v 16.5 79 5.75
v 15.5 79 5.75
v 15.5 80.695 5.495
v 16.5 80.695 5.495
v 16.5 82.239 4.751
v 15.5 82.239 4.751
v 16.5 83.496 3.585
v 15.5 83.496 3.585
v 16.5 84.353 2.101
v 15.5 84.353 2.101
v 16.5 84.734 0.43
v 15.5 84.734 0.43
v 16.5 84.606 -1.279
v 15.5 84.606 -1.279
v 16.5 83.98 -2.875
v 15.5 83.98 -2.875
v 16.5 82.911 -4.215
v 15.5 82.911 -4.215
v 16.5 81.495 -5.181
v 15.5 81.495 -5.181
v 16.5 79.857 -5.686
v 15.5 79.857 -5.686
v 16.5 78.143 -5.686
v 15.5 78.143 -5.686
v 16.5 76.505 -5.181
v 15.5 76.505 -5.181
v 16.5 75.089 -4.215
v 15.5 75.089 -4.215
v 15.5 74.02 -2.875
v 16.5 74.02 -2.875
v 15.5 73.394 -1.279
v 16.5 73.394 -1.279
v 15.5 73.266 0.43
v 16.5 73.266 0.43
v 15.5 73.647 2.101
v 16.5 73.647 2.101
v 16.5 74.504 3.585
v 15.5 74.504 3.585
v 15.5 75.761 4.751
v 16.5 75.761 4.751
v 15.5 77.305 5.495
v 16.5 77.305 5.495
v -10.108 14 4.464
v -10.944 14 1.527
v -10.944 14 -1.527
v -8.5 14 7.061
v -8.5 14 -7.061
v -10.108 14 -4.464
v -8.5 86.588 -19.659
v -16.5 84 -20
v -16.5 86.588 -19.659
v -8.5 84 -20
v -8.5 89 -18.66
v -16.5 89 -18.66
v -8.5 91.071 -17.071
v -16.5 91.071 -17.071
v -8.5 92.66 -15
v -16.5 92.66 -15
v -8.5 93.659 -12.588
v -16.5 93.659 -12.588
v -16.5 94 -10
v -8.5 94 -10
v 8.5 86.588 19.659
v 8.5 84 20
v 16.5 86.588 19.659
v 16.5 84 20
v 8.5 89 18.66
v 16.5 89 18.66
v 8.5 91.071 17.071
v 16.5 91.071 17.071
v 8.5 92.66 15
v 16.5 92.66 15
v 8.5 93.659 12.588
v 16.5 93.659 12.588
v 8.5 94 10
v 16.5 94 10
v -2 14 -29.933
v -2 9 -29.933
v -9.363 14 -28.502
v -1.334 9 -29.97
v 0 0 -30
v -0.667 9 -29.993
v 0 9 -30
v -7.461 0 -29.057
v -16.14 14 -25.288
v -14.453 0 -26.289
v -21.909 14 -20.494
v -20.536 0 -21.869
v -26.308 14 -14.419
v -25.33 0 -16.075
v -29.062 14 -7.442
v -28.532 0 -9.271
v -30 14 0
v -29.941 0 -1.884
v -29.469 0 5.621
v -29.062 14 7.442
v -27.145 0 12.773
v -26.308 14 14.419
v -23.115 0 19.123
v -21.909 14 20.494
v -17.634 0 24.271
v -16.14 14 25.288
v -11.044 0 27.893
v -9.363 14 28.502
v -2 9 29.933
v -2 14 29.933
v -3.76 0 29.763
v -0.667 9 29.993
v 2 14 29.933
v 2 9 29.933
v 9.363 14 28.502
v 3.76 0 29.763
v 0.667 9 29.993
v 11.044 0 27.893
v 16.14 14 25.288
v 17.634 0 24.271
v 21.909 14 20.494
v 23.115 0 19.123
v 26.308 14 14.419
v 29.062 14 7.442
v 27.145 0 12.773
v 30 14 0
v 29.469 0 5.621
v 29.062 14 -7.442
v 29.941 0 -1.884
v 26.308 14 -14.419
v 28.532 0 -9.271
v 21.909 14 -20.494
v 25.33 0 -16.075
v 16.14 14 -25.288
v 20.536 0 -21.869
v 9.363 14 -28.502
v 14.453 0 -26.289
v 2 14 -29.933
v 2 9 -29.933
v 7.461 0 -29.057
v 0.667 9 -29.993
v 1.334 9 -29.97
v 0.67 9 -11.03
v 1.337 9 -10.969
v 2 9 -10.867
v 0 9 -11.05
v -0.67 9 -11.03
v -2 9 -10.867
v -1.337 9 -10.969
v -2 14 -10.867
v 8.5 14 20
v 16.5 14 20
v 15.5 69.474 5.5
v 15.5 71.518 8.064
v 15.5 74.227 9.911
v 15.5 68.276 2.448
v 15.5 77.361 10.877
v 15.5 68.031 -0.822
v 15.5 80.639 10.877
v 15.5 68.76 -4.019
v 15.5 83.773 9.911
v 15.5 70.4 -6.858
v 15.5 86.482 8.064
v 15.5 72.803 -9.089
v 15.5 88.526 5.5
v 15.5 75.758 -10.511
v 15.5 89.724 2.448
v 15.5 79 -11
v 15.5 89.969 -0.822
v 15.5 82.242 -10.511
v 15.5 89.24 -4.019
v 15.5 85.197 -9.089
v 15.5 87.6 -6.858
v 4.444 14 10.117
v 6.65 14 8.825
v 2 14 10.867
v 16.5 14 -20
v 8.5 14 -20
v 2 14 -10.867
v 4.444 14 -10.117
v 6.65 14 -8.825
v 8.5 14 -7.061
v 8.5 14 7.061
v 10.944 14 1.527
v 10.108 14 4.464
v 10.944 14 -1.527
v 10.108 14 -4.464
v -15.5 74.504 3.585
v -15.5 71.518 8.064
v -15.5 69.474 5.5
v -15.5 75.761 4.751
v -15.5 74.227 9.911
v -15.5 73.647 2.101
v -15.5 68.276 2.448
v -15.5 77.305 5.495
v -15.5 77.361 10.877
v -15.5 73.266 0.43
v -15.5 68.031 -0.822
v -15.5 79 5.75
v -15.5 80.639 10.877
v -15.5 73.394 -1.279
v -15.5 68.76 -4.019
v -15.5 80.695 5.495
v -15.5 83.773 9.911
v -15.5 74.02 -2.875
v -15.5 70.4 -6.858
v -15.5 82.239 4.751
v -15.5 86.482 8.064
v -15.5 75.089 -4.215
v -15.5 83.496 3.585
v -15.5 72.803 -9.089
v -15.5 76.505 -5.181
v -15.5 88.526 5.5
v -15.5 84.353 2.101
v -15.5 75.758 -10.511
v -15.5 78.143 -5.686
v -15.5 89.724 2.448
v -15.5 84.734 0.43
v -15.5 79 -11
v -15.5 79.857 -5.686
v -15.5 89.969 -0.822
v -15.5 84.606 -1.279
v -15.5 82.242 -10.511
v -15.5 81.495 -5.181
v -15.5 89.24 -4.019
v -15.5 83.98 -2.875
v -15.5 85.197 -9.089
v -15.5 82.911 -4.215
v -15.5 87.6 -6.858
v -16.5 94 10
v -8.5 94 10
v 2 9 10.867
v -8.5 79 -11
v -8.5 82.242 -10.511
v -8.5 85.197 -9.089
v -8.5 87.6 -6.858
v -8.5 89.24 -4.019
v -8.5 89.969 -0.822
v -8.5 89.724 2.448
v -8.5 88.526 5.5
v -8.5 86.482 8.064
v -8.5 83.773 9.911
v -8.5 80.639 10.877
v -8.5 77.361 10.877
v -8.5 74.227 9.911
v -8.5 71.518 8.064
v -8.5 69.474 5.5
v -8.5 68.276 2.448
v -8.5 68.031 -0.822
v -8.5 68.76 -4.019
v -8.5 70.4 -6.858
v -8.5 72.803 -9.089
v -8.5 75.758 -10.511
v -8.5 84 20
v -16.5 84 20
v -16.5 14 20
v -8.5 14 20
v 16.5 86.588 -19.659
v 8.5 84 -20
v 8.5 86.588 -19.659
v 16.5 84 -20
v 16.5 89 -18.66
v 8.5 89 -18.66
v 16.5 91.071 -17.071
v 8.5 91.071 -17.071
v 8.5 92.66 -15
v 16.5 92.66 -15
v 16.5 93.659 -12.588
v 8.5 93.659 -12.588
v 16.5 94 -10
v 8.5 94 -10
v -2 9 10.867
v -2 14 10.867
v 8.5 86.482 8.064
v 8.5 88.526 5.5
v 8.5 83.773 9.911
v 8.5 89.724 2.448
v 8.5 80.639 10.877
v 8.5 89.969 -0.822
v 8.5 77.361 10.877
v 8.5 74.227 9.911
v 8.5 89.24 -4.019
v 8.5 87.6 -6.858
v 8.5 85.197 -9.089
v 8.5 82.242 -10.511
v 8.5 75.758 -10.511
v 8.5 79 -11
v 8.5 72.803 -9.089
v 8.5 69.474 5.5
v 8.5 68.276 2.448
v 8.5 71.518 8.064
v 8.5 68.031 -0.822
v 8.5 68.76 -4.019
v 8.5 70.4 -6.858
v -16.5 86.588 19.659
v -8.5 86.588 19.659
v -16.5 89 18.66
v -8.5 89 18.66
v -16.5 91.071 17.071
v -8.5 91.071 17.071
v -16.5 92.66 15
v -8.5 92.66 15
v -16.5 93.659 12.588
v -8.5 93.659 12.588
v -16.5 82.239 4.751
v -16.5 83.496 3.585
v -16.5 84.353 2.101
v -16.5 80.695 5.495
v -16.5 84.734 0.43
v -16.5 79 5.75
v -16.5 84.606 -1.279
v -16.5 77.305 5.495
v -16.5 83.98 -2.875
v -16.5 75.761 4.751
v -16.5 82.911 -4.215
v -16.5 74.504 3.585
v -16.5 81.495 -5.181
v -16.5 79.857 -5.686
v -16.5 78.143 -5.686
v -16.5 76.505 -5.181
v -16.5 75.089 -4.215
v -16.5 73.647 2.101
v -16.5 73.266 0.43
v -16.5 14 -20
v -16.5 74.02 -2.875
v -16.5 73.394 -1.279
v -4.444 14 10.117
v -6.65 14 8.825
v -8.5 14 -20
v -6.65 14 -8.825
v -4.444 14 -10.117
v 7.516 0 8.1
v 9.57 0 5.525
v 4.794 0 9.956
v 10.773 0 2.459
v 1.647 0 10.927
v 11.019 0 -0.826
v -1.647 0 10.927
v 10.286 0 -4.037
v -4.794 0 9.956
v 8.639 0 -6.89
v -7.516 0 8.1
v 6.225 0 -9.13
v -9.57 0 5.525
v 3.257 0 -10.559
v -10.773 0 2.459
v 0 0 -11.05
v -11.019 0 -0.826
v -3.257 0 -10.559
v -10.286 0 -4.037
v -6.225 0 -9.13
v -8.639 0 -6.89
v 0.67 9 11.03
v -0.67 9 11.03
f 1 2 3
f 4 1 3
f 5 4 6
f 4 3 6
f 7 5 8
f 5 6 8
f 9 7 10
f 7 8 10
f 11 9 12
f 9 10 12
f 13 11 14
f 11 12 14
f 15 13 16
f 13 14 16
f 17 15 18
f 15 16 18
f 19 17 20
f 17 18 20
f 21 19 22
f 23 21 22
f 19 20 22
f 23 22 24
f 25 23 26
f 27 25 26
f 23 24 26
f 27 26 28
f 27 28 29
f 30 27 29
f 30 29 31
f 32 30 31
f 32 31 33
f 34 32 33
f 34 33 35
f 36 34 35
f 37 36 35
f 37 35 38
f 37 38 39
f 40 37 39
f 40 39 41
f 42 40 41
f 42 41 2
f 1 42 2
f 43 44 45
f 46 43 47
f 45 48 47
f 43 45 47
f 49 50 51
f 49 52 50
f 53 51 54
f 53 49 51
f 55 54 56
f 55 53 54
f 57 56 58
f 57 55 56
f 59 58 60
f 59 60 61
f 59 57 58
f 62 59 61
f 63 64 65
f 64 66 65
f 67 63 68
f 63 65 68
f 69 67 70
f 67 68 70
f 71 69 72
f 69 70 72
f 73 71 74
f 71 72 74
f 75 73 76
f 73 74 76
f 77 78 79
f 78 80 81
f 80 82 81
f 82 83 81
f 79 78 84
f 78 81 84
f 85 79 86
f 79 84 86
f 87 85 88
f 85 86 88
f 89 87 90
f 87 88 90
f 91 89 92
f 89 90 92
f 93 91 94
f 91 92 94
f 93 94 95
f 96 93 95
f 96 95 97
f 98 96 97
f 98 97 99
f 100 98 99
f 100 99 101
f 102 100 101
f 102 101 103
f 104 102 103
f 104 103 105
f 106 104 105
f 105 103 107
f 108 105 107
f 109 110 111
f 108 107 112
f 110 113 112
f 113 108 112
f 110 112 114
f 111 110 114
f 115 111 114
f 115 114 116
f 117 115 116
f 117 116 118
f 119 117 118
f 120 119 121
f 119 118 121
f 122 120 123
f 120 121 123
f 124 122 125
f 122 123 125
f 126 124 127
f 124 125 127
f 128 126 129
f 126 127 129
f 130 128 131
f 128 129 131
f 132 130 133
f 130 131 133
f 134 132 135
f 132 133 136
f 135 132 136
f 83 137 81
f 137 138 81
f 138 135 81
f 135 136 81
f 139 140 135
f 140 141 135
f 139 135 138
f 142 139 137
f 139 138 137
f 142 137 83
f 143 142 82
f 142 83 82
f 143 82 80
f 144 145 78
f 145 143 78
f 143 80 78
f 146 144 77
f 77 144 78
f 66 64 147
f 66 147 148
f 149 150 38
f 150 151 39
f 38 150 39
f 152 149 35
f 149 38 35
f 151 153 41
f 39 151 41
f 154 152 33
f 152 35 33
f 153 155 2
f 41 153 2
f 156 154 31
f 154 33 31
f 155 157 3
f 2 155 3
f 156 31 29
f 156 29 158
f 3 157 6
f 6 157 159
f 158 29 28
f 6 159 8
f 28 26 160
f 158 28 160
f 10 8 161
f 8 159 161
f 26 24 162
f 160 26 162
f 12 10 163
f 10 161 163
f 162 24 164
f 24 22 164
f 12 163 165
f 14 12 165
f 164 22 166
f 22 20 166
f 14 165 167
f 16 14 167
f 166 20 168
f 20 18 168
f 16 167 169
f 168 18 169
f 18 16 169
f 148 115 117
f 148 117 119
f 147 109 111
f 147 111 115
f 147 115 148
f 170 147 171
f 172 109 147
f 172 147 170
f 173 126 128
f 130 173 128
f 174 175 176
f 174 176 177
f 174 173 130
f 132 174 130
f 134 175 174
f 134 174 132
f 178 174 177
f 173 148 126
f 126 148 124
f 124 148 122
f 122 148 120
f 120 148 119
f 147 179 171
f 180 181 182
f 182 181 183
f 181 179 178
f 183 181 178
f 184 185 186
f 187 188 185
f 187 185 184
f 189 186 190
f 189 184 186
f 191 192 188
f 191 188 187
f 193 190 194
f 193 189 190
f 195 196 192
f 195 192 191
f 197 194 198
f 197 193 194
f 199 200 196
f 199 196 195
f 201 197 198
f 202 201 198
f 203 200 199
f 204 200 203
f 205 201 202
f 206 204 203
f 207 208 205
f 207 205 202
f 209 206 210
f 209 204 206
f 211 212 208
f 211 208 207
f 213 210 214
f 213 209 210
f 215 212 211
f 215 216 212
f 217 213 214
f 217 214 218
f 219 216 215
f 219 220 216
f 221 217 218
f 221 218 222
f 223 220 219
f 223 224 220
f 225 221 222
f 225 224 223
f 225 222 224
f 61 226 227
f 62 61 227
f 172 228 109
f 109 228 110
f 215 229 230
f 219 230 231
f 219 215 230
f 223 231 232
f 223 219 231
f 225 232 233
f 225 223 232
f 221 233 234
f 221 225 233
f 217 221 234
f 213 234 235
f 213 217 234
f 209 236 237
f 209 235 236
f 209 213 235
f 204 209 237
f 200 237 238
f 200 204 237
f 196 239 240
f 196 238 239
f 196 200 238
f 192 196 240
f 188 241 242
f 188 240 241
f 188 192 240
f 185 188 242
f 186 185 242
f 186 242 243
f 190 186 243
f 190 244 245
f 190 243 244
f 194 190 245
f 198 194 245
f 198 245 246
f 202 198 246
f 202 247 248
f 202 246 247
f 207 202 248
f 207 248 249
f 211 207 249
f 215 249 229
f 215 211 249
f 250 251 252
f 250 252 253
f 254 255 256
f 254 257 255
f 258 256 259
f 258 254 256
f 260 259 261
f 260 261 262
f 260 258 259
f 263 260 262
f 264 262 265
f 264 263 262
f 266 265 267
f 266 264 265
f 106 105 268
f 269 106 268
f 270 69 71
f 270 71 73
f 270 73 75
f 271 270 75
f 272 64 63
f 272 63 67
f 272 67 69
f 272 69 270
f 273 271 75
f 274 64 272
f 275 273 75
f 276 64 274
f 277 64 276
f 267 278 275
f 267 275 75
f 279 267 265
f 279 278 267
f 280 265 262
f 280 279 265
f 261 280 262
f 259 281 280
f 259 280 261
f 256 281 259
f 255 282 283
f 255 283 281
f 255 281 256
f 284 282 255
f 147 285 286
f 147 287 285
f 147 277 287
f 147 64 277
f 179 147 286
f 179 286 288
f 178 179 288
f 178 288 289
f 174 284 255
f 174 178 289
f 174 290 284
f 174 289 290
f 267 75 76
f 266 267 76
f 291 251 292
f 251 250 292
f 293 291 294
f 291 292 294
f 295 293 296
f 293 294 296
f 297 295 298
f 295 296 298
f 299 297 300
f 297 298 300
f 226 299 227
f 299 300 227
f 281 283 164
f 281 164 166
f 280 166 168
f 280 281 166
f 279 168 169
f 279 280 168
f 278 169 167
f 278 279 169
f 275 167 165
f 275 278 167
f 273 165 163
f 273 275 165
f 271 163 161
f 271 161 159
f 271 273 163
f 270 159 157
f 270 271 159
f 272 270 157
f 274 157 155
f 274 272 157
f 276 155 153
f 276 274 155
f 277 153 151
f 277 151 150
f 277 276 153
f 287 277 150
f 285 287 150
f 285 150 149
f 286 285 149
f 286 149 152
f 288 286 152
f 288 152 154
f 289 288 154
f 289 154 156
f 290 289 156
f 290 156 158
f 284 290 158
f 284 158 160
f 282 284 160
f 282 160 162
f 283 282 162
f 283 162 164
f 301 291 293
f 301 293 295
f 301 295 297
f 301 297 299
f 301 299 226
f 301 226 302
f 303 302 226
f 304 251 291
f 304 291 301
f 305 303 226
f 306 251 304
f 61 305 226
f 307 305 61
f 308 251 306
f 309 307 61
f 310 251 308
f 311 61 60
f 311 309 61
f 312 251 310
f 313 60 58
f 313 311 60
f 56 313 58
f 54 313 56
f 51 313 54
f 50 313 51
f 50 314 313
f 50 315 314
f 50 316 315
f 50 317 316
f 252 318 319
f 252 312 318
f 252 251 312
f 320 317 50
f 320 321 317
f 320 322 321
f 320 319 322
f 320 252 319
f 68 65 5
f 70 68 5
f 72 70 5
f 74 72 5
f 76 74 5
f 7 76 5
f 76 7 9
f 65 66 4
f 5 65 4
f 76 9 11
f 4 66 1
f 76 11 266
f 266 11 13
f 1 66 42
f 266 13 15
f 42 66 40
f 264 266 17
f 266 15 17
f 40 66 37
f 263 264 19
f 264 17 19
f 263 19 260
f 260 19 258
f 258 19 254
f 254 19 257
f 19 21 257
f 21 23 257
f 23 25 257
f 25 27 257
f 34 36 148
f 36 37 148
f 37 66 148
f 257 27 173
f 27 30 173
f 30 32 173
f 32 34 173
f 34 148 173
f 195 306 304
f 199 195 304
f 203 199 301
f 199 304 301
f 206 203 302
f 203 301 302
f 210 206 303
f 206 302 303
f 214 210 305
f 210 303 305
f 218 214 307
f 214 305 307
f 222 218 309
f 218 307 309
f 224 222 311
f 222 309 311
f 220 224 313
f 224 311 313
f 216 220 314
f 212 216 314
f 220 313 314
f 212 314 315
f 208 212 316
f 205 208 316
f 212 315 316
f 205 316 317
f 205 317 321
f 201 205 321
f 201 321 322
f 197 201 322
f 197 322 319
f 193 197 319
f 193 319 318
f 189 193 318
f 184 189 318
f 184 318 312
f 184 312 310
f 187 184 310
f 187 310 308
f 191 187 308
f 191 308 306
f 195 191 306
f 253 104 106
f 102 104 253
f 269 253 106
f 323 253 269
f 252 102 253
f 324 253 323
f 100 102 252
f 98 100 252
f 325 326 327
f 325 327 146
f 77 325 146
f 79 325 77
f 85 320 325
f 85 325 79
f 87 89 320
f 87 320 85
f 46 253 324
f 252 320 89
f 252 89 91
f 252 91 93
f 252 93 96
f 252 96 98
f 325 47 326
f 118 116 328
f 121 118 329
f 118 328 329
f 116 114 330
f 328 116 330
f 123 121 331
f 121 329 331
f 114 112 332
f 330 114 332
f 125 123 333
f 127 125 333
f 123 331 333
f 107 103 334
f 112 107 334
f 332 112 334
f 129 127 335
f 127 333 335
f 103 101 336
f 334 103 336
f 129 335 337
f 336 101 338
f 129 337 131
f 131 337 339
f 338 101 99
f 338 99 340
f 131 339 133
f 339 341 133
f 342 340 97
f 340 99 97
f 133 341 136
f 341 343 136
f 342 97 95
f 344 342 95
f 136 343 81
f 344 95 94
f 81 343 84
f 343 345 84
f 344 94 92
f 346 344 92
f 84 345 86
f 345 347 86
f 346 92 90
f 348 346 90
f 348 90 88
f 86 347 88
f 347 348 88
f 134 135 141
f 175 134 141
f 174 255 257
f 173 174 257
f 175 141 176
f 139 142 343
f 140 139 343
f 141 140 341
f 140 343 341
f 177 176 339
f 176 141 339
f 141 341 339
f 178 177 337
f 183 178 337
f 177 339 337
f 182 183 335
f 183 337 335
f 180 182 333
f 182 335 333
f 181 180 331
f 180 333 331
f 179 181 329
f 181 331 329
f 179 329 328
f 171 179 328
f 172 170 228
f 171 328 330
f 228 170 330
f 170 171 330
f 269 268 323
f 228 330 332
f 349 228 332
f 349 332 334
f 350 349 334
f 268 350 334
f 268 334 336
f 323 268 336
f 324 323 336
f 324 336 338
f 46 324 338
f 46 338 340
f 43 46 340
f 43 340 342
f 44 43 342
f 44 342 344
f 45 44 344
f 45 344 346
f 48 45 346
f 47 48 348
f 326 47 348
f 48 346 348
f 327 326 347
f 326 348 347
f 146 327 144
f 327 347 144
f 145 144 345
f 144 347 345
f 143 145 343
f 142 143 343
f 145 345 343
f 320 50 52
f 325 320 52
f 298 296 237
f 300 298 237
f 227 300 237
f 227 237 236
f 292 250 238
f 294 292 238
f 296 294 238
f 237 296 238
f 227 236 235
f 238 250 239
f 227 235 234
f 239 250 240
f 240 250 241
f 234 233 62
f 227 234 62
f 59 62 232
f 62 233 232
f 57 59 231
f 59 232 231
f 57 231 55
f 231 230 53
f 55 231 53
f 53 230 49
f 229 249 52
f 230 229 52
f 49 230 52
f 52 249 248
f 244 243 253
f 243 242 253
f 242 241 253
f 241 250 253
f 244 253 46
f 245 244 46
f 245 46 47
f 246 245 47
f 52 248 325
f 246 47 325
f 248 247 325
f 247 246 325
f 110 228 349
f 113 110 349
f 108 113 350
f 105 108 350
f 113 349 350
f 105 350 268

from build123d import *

# Parameters (mm, degrees)
SKETCH1_R               = 30
BOSS_EXTRUDE1_DEPTH     = 14
SKETCH2_R               = 11.05
CUT_EXTRUDE1_DEPTH      = 45.676615807
SKETCH5_W               = 8
SKETCH5_H               = 40
BOSS_EXTRUDE2_DEPTH     = 80
FILLET1_R               = 10
CUT_EXTRUDE4_START      = -5
CUT_EXTRUDE4_DEPTH      = 5
CUT_EXTRUDE5_DEPTH      = 15.5
CUT_EXTRUDE5_DEPTH_BACK = 15.5
SKETCH12_R              = 11
CUT_EXTRUDE6_REACH      = 111.079
SKETCH13_R              = 5.75


with BuildPart() as part:
    # Sketch1 → Boss-Extrude1 (new body)
    with BuildSketch(Plane(origin=(0, 0, 0), x_dir=(1, 0, 0), z_dir=(0, 1, 0))):
        with Locations(Location((0, 0, 0), (0, 0, 90))):
            Circle(SKETCH1_R)
    extrude(amount=BOSS_EXTRUDE1_DEPTH)

    # Sketch2 → Cut-Extrude1 (cut, through all)
    with BuildSketch(Plane.XZ):
        with Locations(Location((0, 0, 0), (0, 0, 270))):
            Circle(SKETCH2_R)
    extrude(amount=-CUT_EXTRUDE1_DEPTH, mode=Mode.SUBTRACT)

    # Sketch5 → Boss-Extrude2 (add)
    with BuildSketch(Plane(origin=(0, 14, 0), x_dir=(1, 0, 0), z_dir=(0, 1, 0))):
        with Locations((-12.5, 0)):
            Rectangle(SKETCH5_W, SKETCH5_H)
        with Locations((12.5, 0)):
            Rectangle(SKETCH5_W, SKETCH5_H)
    extrude(amount=BOSS_EXTRUDE2_DEPTH)

    # Fillet1
    fillet1_edges = [part.edges().sort_by_distance(p)[0] for p in [
        (-12.5, 94, 20),
        (-12.5, 94, -20),
        (12.5, 94, 20),
        (12.5, 94, -20),
    ]]
    fillet(fillet1_edges, radius=FILLET1_R)

    # Sketch8 → Cut-Extrude4 (cut)
    with BuildSketch(Plane(origin=(0, 14, 0), x_dir=(1, 0, 0), z_dir=(0, 1, 0)).offset(CUT_EXTRUDE4_START)):
        with BuildLine():
            Line((2, 29.933259094), (2, -29.933259094))
            ThreePointArc((2, -29.933259094), (0, -30), (-2, -29.933259094))
            Line((-2, -29.933259094), (-2, 29.933259094))
            ThreePointArc((-2, 29.933259094), (0, 30), (2, 29.933259094))
        make_face()
    extrude(amount=CUT_EXTRUDE4_DEPTH, mode=Mode.SUBTRACT)

    # Sketch12 → Cut-Extrude5 (cut, two sides: drawn at the far end of the back side and taken through both)
    with BuildSketch(Plane(origin=(0, 0, 0), x_dir=(0, 0, -1), z_dir=(1, 0, 0)).offset(-CUT_EXTRUDE5_DEPTH_BACK)):
        with Locations((0, 79)):
            Circle(SKETCH12_R)
    extrude(amount=CUT_EXTRUDE5_DEPTH + CUT_EXTRUDE5_DEPTH_BACK, mode=Mode.SUBTRACT)

    # Cut-Extrude6: up to this face of the body (flat: up to its plane)
    cut_extrude6_end = Plane(part.part.faces().sort_by_distance((16.5, 53.48656843, 0))[0])
    # Sketch13 → Cut-Extrude6 (cut, up to the picked face)
    with BuildSketch(Plane.ZY.offset(16.5), mode=Mode.PRIVATE) as cut_extrude6_sk1:
        with Locations((0, 79)):
            Circle(SKETCH13_R)
    cut_extrude6_tool1 = split(extrude(cut_extrude6_sk1.sketch, amount=-CUT_EXTRUDE6_REACH, mode=Mode.PRIVATE), bisect_by=cut_extrude6_end, keep=Keep.BOTH, mode=Mode.PRIVATE)
    add(cut_extrude6_tool1.solids().sort_by(Axis((-16.5, 79, 0), (1, 0, 0)))[0], mode=Mode.SUBTRACT)


solid = part.part
